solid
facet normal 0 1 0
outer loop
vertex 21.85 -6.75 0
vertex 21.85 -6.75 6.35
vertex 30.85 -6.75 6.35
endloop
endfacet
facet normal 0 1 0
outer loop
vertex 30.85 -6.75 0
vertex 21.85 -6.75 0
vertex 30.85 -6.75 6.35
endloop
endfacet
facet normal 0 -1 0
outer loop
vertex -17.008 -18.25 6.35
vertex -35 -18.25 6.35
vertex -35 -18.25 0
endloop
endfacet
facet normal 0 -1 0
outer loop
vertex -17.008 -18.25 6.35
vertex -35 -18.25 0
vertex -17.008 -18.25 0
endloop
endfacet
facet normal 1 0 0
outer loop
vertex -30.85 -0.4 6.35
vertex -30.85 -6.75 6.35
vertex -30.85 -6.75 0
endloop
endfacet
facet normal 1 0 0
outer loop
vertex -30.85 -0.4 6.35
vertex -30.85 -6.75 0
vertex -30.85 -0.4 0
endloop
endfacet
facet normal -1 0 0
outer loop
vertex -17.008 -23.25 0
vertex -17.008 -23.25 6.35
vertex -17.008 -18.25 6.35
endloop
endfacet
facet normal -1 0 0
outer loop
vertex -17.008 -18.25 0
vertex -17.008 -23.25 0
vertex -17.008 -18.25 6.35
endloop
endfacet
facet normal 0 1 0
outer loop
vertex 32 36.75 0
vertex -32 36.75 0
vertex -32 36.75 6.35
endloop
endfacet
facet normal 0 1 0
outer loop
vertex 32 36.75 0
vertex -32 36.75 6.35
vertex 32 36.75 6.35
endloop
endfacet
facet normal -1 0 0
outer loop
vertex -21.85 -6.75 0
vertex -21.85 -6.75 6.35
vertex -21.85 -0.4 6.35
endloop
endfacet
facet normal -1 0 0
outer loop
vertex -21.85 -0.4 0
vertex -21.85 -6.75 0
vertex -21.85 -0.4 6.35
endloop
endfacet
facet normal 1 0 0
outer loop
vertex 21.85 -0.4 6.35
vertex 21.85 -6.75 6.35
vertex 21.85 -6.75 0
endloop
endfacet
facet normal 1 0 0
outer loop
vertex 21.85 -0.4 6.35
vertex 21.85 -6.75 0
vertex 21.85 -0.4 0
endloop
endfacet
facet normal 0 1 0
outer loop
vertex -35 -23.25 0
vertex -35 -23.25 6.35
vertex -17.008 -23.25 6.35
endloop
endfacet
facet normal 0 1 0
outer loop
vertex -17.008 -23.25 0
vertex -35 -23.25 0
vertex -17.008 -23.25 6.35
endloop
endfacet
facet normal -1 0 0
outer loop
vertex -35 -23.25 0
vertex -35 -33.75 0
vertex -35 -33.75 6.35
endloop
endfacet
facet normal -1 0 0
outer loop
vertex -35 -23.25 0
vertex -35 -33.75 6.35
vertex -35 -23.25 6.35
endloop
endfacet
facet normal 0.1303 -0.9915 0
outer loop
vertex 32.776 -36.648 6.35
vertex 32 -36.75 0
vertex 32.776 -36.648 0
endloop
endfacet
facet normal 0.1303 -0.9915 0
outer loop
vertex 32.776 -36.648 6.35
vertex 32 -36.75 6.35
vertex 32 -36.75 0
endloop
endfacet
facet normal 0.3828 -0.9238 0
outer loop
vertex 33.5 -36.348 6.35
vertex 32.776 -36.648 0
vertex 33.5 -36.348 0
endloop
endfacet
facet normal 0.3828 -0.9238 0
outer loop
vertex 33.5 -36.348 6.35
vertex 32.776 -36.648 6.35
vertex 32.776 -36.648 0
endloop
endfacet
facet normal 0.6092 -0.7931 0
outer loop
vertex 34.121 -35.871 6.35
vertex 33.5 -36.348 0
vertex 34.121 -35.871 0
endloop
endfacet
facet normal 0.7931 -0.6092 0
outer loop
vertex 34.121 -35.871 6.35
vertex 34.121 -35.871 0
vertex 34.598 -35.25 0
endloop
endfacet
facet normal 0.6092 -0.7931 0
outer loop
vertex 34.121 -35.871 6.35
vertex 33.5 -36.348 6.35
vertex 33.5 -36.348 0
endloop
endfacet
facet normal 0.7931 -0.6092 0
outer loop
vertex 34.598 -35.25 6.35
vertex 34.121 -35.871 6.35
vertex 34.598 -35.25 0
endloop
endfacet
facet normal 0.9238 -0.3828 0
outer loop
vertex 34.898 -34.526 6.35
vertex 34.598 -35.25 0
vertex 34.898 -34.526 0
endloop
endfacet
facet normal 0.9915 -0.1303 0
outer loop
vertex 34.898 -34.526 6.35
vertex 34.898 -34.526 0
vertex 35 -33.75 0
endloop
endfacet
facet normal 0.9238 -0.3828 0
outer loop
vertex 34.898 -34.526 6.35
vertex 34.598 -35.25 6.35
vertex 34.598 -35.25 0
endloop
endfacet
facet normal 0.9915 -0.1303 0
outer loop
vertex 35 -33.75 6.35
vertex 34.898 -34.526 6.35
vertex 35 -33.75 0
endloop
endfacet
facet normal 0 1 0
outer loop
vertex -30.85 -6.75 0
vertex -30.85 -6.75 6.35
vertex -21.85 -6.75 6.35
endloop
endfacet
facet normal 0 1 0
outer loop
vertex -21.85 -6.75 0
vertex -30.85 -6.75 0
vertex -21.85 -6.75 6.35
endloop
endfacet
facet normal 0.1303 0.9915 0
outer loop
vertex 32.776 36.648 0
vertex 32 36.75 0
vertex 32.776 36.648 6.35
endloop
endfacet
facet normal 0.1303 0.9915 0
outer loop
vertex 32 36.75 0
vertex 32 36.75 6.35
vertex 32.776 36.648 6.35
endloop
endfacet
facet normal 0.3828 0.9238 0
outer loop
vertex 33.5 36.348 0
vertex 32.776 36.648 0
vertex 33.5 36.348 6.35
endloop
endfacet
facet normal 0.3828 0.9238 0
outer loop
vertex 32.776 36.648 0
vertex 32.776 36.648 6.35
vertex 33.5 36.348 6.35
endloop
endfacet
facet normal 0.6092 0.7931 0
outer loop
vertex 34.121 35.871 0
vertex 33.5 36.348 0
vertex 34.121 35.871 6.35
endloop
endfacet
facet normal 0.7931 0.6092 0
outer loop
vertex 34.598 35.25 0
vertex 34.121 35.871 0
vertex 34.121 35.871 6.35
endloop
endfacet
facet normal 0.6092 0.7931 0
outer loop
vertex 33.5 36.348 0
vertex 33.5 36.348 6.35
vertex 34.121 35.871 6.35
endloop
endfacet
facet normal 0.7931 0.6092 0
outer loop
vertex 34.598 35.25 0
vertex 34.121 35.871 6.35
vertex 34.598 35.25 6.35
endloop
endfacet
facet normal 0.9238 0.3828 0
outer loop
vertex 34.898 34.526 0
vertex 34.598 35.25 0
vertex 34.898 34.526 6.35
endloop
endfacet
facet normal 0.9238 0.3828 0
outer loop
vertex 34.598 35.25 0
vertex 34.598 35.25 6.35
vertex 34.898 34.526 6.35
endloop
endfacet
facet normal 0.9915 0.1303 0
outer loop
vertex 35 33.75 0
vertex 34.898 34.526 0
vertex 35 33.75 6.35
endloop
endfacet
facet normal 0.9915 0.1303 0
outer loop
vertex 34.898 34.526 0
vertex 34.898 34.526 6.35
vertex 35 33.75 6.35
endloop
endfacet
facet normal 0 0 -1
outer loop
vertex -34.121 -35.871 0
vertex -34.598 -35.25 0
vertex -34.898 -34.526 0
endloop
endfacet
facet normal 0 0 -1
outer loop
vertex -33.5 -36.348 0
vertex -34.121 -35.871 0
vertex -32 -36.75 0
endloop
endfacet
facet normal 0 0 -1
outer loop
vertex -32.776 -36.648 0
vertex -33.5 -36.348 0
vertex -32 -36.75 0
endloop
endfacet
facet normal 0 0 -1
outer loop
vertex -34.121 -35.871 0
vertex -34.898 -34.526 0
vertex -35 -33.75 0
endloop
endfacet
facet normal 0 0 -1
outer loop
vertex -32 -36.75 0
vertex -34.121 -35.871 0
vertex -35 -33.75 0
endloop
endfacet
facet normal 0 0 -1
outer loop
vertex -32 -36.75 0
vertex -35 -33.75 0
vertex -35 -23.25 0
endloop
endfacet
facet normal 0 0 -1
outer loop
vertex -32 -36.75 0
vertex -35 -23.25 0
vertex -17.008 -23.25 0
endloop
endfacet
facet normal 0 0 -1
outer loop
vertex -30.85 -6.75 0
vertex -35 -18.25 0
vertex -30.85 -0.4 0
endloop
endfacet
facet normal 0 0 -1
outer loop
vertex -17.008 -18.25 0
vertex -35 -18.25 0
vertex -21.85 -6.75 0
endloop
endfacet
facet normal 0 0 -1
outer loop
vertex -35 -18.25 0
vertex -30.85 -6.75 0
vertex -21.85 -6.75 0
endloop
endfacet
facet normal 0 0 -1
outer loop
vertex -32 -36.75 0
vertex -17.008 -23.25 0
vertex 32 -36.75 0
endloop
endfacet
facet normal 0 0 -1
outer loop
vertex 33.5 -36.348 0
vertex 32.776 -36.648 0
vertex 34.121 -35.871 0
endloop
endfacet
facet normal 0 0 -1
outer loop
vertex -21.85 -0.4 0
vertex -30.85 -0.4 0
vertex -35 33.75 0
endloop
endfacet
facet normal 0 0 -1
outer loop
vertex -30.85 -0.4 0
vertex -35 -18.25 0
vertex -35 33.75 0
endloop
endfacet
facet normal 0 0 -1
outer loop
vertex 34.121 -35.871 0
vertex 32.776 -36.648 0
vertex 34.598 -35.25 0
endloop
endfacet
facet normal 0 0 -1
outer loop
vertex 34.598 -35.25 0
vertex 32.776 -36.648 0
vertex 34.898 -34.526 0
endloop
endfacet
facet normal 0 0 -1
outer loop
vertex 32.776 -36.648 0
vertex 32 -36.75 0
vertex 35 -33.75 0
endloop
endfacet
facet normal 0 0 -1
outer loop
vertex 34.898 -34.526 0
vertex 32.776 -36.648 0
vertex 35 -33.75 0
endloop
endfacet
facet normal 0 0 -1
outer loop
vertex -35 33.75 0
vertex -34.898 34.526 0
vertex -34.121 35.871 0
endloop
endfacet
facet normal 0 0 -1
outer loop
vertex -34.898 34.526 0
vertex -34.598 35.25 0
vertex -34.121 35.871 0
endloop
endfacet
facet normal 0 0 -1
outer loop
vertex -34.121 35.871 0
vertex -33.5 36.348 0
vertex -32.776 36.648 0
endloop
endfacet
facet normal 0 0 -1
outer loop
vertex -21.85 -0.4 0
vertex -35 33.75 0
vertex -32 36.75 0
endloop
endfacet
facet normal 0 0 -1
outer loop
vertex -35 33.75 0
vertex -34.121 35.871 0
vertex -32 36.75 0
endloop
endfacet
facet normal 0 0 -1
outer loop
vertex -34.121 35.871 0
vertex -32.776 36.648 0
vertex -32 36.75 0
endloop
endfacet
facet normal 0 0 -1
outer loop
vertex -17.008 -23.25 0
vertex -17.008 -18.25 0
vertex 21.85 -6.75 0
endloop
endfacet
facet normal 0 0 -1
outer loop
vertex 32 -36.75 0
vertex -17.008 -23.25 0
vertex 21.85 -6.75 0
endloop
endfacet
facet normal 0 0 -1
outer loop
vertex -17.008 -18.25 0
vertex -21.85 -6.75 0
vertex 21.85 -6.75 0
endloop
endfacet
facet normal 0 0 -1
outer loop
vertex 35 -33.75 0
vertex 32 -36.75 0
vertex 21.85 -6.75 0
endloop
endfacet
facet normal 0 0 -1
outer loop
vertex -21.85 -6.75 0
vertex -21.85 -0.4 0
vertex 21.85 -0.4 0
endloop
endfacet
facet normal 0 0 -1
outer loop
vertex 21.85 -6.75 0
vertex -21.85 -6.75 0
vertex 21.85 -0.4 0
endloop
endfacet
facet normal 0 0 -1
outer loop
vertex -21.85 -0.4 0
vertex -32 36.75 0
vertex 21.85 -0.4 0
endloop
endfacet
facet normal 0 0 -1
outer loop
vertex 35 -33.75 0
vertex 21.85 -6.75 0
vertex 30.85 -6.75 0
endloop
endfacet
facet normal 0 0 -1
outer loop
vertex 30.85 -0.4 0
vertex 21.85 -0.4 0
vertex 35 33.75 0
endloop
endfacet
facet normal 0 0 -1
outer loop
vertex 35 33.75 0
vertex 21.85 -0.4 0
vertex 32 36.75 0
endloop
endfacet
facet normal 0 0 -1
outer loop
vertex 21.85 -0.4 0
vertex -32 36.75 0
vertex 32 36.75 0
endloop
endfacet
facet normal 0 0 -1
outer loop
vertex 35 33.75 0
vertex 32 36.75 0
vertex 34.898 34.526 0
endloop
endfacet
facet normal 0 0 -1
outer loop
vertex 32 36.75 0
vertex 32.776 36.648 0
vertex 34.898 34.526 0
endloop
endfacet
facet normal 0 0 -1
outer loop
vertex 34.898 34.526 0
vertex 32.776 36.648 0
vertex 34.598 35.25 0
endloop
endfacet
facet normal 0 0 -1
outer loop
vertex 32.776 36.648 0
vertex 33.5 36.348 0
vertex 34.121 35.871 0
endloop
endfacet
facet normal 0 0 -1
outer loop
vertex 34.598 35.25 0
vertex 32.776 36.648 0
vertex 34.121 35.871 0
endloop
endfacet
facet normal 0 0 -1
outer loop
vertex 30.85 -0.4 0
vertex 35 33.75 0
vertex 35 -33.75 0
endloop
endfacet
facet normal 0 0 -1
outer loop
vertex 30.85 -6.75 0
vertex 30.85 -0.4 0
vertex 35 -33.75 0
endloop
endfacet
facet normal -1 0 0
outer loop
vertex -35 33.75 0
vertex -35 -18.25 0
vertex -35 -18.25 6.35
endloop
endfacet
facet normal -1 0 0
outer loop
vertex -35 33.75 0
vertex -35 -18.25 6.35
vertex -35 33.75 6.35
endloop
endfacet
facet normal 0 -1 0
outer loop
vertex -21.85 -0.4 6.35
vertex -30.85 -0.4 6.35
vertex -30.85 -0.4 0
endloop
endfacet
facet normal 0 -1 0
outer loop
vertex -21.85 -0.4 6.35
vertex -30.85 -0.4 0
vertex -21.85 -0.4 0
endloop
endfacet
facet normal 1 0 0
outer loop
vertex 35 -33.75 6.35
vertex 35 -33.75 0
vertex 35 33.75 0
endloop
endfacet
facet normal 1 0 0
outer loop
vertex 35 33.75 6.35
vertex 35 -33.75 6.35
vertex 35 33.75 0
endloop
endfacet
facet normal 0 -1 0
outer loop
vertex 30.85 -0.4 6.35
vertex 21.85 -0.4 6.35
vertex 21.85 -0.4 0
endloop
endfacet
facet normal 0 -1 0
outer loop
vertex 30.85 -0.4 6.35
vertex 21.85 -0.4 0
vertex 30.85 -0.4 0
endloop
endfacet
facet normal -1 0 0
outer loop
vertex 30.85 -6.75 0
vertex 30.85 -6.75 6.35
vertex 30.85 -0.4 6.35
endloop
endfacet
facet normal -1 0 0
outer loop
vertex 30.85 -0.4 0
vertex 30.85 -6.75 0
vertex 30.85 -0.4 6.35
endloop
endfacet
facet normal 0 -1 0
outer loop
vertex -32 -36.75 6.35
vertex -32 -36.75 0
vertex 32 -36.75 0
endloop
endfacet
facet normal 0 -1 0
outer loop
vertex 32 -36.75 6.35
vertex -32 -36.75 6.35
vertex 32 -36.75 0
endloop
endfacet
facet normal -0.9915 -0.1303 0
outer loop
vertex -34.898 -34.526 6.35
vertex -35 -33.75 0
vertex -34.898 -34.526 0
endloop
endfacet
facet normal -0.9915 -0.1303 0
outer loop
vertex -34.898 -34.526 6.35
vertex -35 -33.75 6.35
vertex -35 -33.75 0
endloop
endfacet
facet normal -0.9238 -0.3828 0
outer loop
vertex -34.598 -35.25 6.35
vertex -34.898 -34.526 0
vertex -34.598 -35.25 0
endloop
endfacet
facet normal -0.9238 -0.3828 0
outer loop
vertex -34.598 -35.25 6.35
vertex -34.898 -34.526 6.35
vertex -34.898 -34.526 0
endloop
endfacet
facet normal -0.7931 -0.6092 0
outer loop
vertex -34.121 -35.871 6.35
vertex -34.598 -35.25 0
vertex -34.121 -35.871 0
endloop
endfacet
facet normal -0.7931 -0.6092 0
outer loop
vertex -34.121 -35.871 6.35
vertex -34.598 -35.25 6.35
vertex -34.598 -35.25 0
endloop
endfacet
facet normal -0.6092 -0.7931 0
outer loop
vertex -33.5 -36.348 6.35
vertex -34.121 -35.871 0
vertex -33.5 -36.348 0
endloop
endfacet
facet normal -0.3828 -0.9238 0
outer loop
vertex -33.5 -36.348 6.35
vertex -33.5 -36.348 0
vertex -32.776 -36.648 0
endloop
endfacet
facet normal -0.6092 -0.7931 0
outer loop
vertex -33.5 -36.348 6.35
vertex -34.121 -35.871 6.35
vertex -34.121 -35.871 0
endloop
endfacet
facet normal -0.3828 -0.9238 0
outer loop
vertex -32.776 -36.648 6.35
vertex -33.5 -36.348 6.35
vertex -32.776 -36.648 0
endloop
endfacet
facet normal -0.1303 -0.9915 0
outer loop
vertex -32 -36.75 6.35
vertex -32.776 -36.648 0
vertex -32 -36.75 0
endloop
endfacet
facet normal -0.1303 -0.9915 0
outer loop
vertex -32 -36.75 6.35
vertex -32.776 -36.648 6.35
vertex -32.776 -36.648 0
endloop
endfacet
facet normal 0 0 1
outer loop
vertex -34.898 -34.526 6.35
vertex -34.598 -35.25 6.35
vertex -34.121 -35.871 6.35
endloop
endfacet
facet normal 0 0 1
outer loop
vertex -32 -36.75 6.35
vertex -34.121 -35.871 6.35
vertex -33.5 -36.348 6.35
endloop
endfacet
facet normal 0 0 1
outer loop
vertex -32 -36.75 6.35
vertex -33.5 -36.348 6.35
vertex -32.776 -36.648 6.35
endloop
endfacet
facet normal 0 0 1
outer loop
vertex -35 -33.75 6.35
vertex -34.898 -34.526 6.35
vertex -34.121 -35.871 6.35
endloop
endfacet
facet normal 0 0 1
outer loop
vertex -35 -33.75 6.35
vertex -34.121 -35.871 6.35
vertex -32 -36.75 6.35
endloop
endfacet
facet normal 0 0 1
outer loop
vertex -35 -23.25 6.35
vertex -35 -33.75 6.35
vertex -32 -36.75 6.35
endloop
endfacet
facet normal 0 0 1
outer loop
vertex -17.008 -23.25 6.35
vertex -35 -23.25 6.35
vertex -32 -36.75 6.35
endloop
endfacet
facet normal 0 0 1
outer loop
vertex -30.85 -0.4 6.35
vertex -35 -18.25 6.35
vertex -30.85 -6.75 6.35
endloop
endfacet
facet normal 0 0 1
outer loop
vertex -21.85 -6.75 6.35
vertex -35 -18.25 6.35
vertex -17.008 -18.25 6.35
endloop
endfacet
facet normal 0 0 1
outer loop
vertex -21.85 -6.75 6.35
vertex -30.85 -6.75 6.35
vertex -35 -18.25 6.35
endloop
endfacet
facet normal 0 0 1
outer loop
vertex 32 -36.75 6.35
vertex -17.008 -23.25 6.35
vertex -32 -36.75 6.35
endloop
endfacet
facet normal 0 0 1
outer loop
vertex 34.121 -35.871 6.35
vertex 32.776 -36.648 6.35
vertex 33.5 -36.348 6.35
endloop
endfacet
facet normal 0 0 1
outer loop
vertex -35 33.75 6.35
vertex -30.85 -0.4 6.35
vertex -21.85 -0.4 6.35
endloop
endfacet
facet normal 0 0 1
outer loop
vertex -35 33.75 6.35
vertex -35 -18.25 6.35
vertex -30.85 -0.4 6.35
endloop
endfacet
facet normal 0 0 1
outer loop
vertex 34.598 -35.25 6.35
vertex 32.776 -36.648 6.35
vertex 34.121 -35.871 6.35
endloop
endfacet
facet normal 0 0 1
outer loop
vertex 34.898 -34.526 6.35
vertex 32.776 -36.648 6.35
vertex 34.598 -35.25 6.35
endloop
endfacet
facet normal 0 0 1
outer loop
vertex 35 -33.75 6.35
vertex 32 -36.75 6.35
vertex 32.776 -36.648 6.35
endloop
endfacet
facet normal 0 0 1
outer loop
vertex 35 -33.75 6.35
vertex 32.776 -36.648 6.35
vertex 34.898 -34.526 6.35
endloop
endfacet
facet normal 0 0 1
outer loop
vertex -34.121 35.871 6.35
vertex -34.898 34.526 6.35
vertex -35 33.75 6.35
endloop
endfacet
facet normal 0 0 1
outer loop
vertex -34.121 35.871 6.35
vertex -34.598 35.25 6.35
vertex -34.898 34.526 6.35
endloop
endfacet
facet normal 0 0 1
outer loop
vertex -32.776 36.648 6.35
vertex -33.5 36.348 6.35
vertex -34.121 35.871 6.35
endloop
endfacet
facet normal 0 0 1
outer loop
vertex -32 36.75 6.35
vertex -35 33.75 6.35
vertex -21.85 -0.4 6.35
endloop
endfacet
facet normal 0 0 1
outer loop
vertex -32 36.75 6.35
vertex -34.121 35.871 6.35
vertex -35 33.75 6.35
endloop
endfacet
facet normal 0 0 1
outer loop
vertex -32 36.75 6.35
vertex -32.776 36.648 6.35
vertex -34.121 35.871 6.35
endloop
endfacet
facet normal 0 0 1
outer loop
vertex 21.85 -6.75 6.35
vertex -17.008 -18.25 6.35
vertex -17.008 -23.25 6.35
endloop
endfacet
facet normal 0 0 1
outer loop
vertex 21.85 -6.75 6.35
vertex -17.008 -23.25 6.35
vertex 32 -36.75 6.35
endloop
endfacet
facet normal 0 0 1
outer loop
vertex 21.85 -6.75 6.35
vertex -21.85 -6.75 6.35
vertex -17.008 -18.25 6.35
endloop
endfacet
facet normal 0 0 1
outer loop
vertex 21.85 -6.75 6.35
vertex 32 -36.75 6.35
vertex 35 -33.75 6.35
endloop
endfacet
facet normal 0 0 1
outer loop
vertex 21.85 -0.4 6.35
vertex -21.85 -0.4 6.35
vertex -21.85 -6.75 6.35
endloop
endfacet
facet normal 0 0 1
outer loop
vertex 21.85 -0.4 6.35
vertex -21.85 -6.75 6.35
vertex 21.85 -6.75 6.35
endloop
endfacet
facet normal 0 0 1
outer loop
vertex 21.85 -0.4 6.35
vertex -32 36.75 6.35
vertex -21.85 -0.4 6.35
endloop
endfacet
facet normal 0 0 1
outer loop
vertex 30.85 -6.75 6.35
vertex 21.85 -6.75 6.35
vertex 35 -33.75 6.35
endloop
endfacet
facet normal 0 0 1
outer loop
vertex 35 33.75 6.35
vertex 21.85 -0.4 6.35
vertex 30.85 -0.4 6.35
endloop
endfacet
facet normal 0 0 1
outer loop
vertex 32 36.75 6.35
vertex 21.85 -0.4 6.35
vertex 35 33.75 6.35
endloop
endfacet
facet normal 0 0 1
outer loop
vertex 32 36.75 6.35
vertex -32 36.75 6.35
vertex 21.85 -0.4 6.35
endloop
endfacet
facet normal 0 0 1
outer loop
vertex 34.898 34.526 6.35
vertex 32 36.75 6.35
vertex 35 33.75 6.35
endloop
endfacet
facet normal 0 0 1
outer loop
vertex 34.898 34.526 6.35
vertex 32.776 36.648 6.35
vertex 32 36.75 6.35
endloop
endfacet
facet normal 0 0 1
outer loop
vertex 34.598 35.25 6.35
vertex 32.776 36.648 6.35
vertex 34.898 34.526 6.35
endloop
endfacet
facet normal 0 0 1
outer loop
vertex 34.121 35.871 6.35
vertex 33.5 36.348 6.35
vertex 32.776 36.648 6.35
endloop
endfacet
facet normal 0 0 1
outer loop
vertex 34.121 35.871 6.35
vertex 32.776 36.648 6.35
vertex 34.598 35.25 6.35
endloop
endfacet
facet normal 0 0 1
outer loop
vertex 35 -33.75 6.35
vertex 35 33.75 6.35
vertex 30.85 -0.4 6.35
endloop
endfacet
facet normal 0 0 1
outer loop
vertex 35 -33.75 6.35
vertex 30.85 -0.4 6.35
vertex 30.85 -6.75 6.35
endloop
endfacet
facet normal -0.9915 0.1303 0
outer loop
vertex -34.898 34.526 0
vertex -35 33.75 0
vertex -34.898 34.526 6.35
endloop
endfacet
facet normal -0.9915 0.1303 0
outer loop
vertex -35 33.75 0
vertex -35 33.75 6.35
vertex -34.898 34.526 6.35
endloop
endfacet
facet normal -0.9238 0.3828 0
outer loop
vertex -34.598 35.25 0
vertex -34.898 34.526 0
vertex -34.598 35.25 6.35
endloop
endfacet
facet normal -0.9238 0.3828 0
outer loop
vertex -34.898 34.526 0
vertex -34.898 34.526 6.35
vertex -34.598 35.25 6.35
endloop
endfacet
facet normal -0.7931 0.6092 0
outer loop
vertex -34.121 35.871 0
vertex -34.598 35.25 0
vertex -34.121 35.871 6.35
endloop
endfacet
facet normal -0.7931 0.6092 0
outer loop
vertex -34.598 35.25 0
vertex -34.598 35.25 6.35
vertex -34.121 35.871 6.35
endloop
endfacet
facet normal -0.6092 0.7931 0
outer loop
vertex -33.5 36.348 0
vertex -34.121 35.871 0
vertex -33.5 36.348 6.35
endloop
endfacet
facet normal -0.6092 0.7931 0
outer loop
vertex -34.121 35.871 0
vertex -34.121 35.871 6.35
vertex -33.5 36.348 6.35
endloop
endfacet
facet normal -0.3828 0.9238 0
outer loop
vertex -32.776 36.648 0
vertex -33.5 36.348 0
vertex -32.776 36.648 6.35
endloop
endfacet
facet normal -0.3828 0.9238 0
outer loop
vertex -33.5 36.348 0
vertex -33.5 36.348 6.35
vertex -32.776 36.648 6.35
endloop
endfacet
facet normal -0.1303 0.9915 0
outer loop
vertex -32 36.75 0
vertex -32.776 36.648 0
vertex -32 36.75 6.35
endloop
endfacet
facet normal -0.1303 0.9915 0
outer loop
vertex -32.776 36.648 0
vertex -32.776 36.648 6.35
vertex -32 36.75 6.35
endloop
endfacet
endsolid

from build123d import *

# Parameters (mm, degrees)
SKETCH1_W           = 70
SKETCH1_H           = 73.5
BOSS_EXTRUDE1_DEPTH = 6.35
SKETCH2_W           = 9
SKETCH2_H           = 6.35
SKETCH2_W_2         = 17.9920326
SKETCH2_H_2         = 5
CUT_EXTRUDE1_DEPTH  = 6.35
FILLET1_R           = 3


with BuildPart() as part:
    # Sketch1 → Boss-Extrude1 (new body)
    with BuildSketch(Plane.XY):
        Rectangle(SKETCH1_W, SKETCH1_H)
    extrude(amount=BOSS_EXTRUDE1_DEPTH)

    # Sketch2 → Cut-Extrude1 (cut)
    with BuildSketch(Plane.XY.offset(6.35)):
        with Locations((-26.35, -3.575)):
            Rectangle(SKETCH2_W, SKETCH2_H)
        with Locations((-26.0039837, -20.75)):
            Rectangle(SKETCH2_W_2, SKETCH2_H_2)
        with Locations((26.35, -3.575)):
            Rectangle(SKETCH2_W, SKETCH2_H)
    extrude(amount=-CUT_EXTRUDE1_DEPTH, mode=Mode.SUBTRACT)

    # Fillet1
    fillet1_edges = [part.edges().sort_by_distance(p)[0] for p in [
        (35, -36.75, 3.175),
        (-35, -36.75, 3.175),
        (-35, 36.75, 3.175),
        (35, 36.75, 3.175),
    ]]
    fillet(fillet1_edges, radius=FILLET1_R)


solid = part.part
